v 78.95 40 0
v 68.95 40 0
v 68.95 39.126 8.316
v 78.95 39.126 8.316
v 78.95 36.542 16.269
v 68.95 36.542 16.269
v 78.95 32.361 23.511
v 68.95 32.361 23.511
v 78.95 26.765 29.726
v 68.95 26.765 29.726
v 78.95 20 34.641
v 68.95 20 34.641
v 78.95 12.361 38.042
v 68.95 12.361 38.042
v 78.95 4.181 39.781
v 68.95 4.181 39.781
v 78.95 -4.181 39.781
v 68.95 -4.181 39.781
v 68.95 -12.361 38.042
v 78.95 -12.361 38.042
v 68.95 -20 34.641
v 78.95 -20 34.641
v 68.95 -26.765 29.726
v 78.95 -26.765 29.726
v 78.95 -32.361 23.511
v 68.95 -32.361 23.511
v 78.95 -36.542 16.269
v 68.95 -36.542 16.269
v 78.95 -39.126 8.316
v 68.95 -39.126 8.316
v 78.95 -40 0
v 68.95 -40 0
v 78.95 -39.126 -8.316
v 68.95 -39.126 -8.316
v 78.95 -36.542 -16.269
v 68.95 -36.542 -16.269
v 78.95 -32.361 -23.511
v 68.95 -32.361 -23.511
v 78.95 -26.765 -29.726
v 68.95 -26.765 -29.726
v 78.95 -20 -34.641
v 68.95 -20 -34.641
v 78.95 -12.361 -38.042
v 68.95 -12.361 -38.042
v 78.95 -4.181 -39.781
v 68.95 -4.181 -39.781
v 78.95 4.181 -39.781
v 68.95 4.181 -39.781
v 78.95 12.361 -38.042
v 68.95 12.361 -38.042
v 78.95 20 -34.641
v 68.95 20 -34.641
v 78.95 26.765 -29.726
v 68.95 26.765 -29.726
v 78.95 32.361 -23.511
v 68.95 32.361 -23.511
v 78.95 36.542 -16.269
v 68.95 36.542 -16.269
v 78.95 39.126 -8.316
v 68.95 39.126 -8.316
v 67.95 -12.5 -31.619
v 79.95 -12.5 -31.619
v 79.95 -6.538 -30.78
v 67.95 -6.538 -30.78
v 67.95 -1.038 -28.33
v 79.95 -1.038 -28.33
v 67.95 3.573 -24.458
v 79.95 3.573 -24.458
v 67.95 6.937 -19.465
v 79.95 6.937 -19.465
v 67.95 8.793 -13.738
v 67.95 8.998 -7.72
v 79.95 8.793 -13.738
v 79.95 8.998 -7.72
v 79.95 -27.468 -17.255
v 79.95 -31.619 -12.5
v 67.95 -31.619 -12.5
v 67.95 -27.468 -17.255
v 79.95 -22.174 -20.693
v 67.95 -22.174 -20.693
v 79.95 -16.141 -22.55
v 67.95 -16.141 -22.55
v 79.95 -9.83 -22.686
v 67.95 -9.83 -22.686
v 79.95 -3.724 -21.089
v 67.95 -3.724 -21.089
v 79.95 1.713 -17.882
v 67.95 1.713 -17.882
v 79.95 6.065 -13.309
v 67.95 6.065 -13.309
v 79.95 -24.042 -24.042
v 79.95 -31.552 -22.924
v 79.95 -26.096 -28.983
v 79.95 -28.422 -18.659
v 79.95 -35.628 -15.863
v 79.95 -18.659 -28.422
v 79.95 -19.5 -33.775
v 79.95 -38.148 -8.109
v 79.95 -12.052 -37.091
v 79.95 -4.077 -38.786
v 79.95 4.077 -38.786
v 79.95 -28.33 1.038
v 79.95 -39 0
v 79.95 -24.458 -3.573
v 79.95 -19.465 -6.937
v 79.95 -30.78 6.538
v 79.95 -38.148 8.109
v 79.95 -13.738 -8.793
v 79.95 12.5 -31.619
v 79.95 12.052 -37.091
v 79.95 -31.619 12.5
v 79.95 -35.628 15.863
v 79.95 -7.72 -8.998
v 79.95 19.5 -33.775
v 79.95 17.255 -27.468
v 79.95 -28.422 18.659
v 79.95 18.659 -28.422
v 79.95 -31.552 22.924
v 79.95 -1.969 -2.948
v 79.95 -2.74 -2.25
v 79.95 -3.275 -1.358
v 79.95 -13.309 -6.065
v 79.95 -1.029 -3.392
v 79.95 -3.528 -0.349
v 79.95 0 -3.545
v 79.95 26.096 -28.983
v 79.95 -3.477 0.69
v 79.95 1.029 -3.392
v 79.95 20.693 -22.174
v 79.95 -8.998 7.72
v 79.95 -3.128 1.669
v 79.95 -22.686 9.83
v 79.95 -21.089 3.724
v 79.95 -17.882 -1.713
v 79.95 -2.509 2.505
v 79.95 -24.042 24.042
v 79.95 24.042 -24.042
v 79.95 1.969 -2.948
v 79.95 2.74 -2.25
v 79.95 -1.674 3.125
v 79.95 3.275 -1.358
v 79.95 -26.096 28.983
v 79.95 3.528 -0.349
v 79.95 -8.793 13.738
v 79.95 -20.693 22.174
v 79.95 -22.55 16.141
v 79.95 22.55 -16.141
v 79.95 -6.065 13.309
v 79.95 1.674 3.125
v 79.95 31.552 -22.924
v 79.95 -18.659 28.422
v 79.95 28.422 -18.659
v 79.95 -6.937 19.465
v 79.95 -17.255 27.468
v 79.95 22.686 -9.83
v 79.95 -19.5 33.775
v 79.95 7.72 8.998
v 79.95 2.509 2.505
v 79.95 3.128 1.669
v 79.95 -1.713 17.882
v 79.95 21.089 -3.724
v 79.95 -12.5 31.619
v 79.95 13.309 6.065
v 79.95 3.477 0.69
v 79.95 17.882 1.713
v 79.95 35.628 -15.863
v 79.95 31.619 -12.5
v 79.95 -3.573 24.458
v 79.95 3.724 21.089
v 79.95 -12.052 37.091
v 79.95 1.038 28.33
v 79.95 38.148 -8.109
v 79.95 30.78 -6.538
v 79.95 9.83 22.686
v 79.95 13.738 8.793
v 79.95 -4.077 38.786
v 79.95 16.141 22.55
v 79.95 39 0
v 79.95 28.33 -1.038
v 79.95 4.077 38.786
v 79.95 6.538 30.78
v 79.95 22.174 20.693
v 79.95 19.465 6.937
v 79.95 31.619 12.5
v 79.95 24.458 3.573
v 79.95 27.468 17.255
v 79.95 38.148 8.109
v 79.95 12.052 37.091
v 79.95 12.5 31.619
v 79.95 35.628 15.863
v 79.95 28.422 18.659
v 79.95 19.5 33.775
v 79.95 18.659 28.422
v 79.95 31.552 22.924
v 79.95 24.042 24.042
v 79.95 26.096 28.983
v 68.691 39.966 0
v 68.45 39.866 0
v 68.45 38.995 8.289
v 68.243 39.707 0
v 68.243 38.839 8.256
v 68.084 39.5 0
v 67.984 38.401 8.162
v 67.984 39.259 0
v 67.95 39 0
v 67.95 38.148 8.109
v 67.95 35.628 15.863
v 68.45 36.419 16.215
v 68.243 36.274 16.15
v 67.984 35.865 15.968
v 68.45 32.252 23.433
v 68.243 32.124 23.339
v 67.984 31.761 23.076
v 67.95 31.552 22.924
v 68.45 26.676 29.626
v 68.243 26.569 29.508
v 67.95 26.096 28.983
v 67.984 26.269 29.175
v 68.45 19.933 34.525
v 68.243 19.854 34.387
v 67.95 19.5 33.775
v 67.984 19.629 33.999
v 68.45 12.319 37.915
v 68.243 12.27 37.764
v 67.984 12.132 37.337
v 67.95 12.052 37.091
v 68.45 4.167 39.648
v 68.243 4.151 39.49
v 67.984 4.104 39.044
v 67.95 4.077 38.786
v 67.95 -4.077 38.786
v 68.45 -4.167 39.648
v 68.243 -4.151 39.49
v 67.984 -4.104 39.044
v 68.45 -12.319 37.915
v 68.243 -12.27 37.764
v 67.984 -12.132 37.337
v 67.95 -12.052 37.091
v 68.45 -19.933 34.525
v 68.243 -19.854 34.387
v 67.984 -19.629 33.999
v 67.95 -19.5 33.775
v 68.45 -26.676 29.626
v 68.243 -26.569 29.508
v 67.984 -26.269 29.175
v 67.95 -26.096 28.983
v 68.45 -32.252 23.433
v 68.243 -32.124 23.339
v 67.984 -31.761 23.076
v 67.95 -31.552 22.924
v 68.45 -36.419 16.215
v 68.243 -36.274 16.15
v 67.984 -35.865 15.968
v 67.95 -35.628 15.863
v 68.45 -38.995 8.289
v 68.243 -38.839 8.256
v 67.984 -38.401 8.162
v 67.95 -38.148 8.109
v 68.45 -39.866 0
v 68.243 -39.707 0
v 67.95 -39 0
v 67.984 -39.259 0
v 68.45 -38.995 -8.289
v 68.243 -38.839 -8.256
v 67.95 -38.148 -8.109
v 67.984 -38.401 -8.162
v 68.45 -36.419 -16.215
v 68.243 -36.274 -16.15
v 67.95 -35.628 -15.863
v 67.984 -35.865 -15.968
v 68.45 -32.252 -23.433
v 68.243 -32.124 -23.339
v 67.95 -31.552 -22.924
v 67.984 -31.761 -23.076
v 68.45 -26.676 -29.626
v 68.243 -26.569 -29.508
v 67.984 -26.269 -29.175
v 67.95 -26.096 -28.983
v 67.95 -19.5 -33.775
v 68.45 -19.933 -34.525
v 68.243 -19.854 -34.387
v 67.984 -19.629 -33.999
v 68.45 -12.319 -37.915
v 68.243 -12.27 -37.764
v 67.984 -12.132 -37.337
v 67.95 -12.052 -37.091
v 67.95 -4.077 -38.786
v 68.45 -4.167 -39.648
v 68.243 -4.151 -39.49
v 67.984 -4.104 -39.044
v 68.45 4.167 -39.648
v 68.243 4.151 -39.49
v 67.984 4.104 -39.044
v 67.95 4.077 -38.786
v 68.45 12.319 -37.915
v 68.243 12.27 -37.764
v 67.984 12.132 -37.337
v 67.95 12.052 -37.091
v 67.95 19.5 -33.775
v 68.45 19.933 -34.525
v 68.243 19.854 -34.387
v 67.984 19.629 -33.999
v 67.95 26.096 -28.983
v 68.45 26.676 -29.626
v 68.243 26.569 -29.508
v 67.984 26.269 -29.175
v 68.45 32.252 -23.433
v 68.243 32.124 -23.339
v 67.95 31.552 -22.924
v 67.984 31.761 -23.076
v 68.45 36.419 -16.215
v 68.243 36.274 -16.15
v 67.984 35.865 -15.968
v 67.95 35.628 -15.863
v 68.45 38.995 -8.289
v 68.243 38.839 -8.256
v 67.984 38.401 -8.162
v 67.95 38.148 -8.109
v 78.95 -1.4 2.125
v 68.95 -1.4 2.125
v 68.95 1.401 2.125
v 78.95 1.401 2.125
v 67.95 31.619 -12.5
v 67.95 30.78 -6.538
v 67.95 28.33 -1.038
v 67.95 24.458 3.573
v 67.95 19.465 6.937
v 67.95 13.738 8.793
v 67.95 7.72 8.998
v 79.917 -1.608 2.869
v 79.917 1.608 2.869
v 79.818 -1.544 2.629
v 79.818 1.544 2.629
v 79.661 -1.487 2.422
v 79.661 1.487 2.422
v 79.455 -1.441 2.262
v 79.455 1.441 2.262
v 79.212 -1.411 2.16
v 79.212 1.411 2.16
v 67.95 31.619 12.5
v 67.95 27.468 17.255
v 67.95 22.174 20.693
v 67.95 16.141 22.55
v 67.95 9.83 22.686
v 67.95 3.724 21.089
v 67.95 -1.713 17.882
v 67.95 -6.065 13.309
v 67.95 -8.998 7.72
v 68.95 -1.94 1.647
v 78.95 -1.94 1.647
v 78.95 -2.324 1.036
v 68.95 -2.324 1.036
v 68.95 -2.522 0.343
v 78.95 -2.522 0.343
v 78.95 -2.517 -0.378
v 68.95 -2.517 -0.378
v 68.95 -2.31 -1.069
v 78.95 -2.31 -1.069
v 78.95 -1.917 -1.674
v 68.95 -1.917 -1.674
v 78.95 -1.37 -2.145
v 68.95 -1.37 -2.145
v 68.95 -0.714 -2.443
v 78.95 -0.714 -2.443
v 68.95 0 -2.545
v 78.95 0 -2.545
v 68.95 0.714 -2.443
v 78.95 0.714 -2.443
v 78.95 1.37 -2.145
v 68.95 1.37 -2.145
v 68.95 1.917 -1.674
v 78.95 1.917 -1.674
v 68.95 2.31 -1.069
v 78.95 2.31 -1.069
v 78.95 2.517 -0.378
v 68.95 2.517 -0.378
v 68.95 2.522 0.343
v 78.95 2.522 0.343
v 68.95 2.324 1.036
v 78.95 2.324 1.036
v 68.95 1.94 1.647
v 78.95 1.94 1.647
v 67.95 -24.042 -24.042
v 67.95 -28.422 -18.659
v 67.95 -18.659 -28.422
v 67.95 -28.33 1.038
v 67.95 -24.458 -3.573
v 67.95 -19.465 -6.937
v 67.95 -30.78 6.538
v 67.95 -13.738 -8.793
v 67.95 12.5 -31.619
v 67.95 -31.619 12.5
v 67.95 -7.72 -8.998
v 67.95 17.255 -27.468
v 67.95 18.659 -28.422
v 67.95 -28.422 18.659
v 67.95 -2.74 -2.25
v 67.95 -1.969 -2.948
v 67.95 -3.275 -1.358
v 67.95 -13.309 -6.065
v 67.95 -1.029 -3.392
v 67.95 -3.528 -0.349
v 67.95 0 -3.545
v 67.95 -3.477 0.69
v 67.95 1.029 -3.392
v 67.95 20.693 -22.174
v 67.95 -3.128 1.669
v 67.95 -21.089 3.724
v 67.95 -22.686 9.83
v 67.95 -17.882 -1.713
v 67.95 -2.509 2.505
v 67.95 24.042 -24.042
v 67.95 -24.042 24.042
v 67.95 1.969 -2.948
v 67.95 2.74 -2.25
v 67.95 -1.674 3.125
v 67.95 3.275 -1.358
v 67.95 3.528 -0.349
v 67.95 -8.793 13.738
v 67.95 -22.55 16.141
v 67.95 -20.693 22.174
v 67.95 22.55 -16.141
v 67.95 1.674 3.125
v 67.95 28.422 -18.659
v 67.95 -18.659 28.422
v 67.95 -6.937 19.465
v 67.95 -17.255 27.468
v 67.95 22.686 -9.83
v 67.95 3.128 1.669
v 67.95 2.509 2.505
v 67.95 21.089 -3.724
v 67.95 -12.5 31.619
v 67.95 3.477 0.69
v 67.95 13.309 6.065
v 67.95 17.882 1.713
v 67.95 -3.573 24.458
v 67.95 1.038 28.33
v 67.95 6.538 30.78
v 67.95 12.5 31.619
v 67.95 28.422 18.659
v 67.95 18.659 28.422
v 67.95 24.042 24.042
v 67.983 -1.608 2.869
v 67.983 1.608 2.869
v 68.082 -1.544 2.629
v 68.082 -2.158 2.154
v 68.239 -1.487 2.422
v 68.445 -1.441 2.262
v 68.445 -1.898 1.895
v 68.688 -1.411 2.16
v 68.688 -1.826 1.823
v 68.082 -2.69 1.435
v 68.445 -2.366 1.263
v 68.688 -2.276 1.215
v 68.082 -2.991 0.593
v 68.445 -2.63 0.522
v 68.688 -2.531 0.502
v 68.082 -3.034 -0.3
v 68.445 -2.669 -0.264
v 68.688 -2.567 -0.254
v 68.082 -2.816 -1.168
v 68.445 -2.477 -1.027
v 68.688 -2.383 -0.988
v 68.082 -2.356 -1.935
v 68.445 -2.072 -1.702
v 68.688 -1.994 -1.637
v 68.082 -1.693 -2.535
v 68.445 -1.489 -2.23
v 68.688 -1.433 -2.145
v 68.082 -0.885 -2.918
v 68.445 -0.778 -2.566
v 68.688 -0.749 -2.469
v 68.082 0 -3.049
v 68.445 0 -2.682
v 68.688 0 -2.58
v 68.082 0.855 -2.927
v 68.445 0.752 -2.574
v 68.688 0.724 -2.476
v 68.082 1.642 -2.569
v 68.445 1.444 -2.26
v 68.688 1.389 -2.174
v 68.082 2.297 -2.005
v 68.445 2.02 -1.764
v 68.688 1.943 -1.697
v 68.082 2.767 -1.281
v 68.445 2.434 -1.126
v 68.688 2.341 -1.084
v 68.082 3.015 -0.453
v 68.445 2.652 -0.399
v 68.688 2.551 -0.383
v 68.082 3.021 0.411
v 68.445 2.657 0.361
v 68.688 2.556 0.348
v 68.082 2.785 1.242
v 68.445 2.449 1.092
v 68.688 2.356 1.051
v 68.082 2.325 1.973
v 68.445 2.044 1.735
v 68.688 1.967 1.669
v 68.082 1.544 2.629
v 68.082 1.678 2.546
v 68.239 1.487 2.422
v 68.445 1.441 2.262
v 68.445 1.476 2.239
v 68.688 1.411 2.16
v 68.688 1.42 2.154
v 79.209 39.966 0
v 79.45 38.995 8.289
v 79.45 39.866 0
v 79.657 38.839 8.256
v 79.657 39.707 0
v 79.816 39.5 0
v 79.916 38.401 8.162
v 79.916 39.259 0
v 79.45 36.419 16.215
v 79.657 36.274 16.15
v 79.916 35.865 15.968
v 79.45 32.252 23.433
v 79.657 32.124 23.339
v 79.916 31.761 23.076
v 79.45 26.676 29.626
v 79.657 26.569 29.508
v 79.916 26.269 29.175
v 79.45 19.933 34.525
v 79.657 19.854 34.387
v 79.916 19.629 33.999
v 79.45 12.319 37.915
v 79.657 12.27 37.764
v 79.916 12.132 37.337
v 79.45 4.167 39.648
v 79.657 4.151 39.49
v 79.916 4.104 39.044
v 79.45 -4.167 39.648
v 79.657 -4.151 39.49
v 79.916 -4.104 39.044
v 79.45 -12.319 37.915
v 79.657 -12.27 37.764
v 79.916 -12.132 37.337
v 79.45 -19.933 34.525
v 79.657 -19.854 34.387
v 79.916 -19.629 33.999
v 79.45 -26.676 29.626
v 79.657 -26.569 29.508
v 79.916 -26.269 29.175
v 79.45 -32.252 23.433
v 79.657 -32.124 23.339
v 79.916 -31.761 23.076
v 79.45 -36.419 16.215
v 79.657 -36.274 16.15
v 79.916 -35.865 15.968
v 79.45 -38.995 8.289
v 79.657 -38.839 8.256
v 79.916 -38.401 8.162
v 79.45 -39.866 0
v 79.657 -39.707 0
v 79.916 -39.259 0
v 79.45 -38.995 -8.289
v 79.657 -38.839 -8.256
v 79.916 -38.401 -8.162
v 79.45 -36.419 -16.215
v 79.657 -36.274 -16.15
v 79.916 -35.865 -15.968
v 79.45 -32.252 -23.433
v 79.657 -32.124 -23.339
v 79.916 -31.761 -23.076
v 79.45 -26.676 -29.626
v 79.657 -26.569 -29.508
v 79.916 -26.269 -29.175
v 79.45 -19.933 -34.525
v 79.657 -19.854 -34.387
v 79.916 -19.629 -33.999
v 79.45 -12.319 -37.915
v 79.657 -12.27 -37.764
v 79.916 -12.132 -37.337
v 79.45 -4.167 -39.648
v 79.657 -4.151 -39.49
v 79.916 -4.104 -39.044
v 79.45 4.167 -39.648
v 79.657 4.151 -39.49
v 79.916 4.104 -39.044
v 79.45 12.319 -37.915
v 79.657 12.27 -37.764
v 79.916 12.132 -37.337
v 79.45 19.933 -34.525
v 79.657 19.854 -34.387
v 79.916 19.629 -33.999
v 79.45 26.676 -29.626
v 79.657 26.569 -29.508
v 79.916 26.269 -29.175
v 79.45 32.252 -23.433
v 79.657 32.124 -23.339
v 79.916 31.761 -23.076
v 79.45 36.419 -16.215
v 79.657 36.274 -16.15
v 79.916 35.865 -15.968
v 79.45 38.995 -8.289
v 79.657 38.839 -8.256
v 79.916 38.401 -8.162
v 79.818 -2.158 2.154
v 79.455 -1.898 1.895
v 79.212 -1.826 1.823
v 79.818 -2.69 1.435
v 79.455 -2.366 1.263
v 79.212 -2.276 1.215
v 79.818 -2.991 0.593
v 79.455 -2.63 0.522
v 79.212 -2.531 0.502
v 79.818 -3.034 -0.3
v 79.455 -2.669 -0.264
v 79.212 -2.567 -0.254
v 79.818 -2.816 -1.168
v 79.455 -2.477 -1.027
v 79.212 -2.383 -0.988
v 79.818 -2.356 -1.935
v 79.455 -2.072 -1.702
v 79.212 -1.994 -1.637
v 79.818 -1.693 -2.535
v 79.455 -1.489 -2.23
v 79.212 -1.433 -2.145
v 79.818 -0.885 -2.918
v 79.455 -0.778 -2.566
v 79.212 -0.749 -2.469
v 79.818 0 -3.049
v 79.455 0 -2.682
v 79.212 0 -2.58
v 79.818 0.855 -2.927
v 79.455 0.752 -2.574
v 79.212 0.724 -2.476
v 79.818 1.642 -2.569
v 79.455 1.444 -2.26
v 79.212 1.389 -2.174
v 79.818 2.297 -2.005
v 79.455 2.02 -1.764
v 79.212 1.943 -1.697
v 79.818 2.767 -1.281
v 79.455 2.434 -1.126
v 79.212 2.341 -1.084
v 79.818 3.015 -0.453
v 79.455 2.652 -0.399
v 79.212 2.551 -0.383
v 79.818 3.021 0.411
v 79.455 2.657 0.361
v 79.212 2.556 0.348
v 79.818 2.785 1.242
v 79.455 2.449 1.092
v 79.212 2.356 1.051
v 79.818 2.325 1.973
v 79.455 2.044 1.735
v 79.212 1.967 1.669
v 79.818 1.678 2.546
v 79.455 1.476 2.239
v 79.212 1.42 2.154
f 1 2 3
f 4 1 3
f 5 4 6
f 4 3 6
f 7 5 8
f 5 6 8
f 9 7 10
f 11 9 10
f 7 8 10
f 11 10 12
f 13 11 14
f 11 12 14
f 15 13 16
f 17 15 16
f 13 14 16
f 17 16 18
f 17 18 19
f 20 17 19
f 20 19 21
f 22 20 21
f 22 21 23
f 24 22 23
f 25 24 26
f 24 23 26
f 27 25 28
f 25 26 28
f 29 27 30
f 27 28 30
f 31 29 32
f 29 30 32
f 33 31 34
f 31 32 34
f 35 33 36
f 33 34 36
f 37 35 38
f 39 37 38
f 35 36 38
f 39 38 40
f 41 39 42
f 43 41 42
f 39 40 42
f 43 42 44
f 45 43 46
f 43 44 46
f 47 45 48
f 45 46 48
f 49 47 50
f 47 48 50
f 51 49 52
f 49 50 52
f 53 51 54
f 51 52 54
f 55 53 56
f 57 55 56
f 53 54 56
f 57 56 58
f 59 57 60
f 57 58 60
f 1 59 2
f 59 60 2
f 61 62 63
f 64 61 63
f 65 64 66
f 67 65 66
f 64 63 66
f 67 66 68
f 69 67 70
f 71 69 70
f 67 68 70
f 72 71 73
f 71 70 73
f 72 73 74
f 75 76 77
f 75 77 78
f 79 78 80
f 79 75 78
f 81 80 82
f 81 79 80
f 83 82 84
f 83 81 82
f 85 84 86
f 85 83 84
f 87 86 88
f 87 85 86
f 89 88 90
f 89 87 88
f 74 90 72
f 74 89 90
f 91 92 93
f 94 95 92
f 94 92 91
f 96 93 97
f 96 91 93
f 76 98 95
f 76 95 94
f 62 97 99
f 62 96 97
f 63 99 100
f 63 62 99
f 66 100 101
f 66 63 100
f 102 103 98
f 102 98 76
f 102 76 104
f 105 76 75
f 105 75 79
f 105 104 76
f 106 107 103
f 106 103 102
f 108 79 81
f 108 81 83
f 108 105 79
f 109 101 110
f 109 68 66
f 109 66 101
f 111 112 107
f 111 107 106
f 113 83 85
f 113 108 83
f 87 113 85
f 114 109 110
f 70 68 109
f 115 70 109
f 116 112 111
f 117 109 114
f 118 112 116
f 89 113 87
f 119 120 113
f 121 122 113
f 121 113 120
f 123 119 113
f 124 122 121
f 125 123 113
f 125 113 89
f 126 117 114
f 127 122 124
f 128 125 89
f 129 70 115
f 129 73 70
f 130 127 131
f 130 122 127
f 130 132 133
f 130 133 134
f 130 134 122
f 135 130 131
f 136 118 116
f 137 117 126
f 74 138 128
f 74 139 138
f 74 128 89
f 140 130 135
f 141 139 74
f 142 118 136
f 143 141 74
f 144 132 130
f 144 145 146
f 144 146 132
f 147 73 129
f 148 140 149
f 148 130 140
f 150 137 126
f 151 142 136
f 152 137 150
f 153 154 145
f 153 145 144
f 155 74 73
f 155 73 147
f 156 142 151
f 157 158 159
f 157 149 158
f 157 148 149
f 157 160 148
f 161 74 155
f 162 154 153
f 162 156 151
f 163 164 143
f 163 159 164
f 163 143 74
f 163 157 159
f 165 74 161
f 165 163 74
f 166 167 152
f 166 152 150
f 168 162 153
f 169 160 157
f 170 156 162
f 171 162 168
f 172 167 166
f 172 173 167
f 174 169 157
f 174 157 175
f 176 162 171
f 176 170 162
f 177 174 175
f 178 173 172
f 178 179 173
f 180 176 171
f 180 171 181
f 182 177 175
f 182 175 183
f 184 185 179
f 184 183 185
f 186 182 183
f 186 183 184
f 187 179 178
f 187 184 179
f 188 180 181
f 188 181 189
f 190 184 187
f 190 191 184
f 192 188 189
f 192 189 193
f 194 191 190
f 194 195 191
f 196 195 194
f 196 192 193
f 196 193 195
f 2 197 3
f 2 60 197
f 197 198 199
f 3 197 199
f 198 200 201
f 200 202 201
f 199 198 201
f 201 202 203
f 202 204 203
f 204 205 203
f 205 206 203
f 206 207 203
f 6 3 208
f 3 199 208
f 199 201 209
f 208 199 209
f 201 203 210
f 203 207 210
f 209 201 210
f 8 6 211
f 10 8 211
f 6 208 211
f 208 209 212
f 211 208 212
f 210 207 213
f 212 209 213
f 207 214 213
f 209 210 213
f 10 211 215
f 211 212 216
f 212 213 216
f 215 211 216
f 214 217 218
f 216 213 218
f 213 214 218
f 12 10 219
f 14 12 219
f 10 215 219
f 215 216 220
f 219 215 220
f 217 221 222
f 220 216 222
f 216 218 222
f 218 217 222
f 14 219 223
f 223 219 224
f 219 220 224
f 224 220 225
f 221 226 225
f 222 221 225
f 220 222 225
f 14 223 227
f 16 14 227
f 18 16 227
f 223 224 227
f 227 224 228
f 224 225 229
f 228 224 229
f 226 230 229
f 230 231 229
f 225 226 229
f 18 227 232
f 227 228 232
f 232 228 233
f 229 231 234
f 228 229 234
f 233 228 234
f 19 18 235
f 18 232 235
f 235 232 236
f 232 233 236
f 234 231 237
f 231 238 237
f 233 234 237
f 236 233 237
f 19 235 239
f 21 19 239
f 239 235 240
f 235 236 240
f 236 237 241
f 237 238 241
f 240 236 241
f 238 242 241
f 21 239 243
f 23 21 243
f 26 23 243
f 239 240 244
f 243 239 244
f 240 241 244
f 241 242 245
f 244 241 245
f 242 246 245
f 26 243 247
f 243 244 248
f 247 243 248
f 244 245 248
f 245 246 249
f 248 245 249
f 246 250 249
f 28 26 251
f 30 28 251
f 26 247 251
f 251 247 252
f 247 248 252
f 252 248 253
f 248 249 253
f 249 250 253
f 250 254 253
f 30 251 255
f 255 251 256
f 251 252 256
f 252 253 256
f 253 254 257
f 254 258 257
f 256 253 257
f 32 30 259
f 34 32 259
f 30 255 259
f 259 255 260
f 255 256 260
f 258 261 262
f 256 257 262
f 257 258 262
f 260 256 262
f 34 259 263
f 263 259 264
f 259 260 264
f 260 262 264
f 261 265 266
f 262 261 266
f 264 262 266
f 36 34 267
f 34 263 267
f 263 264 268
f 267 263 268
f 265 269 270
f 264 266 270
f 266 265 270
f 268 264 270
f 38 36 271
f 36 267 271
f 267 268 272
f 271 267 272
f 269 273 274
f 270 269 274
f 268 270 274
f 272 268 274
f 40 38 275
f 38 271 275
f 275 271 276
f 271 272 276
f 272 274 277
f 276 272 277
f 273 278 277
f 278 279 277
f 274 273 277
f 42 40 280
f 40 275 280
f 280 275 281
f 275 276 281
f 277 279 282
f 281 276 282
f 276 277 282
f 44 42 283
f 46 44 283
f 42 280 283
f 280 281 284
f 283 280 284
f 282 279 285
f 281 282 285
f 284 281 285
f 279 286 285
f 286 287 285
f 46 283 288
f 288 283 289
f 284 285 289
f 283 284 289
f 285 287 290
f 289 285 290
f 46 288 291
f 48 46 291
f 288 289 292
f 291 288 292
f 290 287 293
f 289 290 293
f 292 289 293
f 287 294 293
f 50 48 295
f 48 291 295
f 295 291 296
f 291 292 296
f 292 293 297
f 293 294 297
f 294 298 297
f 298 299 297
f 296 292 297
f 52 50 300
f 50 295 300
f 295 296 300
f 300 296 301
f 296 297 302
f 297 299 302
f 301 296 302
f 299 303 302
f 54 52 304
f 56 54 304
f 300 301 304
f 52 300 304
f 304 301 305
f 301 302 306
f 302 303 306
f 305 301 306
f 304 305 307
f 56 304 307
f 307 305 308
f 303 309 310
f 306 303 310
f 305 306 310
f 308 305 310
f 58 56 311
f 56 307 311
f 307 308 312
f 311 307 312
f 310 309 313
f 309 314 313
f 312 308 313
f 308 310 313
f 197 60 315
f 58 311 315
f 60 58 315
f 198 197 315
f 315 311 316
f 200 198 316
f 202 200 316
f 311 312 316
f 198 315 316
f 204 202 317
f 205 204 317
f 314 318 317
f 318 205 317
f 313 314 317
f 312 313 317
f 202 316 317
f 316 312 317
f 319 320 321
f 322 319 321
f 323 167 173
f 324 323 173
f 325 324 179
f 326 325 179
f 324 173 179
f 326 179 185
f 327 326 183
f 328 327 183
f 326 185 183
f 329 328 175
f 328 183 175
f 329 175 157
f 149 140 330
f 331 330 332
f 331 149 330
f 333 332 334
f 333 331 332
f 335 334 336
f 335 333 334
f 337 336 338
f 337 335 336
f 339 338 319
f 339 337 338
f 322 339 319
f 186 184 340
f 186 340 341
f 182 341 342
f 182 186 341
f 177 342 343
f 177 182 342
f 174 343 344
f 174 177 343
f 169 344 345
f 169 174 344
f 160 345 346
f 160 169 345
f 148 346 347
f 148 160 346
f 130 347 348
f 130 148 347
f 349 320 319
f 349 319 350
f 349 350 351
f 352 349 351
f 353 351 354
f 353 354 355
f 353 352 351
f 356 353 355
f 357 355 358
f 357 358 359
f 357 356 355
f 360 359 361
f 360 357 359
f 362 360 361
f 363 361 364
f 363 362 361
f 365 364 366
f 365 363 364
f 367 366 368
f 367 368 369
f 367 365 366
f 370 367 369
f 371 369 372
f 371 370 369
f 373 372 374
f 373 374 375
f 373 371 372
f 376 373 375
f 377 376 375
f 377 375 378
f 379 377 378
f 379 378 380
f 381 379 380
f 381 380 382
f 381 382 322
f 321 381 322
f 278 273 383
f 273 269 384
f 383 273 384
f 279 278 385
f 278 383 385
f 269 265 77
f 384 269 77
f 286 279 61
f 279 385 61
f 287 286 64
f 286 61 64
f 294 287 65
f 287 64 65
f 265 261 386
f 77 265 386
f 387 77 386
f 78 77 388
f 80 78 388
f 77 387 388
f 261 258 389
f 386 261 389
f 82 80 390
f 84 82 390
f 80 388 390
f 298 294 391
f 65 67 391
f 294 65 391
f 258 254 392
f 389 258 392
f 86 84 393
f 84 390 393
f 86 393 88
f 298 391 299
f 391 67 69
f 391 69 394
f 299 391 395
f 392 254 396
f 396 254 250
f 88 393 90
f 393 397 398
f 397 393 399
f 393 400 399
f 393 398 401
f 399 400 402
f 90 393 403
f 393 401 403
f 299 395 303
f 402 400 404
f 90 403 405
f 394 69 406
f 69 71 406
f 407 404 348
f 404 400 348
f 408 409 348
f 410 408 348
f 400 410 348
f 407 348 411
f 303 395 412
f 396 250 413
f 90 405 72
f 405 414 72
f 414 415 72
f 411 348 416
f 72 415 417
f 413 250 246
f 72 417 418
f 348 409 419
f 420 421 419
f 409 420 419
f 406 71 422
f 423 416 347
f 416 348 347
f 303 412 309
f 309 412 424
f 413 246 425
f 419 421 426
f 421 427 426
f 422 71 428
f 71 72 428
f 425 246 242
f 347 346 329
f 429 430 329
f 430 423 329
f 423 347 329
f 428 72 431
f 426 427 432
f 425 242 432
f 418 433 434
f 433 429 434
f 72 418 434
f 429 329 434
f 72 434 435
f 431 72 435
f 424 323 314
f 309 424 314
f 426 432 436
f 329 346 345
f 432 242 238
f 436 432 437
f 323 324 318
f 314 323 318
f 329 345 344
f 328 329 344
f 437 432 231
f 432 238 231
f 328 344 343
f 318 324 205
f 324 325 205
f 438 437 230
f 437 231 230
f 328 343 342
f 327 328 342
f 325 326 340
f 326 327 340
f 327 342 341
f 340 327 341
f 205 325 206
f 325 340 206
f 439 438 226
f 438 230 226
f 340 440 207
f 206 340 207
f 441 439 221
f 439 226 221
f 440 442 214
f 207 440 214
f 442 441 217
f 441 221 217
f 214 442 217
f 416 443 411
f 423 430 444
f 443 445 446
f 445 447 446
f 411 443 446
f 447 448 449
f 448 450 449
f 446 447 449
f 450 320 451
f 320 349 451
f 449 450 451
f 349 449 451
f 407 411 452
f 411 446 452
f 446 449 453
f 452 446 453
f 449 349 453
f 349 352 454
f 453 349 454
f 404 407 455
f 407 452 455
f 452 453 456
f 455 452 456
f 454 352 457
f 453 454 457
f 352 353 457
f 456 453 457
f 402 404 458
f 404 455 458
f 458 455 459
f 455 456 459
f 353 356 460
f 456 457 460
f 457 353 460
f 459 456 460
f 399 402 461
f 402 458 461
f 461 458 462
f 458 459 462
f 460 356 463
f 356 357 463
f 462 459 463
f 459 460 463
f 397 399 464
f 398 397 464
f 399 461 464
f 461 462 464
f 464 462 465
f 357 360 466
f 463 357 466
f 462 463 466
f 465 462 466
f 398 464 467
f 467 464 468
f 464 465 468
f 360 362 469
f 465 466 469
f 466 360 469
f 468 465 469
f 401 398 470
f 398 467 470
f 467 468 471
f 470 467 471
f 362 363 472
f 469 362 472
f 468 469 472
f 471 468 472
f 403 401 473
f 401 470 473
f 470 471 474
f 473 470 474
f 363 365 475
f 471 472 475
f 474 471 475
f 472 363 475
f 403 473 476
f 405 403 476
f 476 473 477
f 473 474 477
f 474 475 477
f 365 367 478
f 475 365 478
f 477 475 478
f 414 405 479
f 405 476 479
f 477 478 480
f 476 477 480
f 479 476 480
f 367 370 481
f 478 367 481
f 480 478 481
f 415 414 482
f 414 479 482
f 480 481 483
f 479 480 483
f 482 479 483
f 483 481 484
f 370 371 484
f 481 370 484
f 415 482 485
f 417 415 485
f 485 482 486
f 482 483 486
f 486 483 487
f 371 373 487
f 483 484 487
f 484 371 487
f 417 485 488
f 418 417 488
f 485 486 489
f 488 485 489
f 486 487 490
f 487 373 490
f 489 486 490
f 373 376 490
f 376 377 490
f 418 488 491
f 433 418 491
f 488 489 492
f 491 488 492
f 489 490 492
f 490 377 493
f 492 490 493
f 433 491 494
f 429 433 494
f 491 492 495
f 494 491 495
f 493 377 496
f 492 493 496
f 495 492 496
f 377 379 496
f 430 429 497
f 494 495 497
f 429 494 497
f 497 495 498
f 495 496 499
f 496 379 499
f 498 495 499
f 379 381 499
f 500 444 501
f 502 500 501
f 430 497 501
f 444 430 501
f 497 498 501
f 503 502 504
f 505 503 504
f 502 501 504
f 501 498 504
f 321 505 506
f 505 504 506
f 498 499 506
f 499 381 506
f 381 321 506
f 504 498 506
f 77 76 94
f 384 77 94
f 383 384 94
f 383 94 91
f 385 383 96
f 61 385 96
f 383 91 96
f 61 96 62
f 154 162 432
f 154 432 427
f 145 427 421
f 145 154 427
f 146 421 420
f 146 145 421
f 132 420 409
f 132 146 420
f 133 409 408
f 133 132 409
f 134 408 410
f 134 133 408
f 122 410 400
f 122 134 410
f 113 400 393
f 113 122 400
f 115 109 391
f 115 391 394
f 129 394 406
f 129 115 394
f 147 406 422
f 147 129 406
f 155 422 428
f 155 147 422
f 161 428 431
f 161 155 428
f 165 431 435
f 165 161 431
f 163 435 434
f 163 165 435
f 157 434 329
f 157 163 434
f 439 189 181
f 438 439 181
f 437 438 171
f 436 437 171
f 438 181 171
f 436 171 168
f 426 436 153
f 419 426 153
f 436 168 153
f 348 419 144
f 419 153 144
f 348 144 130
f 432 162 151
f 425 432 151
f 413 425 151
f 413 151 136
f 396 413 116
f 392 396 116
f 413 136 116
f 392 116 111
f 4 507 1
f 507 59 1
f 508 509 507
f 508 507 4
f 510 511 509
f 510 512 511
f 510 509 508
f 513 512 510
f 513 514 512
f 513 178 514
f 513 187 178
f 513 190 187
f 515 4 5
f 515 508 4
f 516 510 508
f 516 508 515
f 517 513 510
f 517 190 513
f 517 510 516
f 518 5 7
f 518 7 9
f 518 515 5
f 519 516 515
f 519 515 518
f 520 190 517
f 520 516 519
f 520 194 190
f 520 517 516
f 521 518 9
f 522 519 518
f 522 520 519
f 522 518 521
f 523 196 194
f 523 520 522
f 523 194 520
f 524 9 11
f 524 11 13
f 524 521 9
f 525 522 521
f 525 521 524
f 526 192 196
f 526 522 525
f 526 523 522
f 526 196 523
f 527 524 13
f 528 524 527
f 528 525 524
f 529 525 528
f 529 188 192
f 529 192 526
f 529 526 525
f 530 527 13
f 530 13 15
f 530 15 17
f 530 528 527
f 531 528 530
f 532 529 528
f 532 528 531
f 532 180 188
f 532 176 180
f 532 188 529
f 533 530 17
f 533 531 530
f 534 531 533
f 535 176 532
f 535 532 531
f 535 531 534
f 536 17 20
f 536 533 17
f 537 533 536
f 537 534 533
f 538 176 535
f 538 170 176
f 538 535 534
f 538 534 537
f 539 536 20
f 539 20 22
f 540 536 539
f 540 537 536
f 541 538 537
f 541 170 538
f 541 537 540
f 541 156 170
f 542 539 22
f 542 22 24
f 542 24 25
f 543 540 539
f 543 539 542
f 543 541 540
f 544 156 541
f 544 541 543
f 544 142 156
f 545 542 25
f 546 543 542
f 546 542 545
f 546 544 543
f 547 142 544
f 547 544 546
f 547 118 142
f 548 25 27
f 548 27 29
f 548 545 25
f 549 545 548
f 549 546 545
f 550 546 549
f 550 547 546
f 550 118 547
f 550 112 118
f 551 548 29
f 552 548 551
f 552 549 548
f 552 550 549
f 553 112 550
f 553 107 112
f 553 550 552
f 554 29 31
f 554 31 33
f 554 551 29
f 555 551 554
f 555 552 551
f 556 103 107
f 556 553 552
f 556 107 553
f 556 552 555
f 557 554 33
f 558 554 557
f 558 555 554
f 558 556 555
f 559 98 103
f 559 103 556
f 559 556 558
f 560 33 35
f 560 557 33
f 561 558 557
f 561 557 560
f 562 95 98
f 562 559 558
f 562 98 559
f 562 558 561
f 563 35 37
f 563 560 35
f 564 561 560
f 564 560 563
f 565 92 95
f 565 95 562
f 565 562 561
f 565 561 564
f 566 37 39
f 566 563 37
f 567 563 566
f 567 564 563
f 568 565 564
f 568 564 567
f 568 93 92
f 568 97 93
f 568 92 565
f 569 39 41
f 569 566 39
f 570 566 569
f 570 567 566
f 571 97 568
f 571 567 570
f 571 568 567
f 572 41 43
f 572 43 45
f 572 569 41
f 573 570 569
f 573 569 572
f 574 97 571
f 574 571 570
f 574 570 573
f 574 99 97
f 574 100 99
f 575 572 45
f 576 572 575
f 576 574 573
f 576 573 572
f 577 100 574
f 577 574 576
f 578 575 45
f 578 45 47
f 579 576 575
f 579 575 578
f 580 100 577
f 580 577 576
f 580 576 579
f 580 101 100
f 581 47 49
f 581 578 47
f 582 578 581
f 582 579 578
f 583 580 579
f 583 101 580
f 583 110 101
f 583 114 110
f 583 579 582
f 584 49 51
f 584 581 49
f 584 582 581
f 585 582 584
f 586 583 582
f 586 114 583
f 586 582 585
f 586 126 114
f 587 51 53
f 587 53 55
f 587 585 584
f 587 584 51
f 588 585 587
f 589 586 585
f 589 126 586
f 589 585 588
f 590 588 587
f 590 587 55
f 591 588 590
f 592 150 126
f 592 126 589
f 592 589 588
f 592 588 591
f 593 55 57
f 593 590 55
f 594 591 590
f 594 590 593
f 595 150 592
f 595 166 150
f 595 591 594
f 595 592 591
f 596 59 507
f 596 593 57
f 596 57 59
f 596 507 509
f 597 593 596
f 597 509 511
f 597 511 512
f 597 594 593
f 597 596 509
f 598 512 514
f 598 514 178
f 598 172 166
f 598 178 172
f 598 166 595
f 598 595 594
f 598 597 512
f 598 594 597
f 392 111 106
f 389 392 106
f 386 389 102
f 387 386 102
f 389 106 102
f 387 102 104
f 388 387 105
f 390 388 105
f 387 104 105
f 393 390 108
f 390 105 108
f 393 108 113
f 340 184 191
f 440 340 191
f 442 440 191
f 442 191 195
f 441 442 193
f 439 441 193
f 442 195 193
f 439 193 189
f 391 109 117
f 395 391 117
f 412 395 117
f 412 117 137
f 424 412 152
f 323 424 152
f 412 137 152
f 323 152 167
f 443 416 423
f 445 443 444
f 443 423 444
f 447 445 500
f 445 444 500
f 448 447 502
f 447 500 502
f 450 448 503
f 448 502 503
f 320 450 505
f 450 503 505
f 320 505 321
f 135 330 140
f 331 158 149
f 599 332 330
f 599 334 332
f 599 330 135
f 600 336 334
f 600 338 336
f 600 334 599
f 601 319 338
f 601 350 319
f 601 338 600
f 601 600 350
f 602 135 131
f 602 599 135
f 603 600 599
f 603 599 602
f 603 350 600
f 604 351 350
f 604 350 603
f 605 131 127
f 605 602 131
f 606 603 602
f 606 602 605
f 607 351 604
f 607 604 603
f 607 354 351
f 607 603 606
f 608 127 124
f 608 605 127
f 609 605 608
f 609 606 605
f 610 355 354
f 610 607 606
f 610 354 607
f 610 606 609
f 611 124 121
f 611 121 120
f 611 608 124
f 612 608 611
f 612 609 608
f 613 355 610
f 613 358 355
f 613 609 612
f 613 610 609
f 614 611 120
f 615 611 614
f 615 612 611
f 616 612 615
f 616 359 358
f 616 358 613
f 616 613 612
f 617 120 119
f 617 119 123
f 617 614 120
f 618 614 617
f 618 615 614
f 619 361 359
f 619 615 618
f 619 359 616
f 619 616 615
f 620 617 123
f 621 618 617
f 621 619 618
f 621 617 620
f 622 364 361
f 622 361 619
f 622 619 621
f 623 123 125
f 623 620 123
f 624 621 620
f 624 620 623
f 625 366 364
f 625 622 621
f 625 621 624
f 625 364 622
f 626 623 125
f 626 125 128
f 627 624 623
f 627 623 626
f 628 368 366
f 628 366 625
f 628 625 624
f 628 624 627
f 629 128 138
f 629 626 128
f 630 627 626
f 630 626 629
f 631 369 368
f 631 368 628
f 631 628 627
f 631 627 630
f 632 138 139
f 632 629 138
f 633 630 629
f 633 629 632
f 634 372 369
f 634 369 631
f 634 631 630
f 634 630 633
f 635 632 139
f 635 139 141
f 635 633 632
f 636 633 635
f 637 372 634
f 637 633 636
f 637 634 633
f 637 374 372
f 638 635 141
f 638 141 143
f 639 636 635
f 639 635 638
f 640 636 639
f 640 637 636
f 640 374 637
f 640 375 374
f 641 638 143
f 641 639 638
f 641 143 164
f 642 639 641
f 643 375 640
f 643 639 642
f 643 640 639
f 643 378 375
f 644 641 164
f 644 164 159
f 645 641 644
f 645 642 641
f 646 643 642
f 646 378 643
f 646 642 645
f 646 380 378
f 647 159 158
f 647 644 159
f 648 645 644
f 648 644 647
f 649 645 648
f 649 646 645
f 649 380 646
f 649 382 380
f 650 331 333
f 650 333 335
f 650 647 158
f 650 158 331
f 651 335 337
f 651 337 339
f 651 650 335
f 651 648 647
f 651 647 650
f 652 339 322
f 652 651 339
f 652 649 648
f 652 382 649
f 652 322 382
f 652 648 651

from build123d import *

# Parameters (mm, degrees)
SKETCH051_R     = 40
PAD040_DEPTH    = 12
POCKET008_DEPTH = 12
FILLET002_R     = 1


with BuildPart() as part:
    # Sketch051 → Pad040 (new body)
    with BuildSketch(Plane.YZ.offset(67.95)):
        Circle(SKETCH051_R)
        with BuildLine():
            ThreePointArc((-1.4005, 2.125), (0, -2.545), (1.4005, 2.125))
            Line((-1.4005, 2.125), (1.4005, 2.125))
        make_face(mode=Mode.SUBTRACT)
    extrude(amount=PAD040_DEPTH)

    # Sketch052 (on Face5 of Pad040) → Pocket008 (cut)
    with BuildSketch(Plane.YZ.offset(79.95)):
        with BuildLine():
            ThreePointArc((-12.5, 31.618824), (-24.041631, 24.041631), (-31.618824, 12.5))
            ThreePointArc((-31.618824, 12.5), (-24.458371, -3.572618), (-7.720294, -8.99829))
            ThreePointArc((-12.5, 31.618824), (-22.685955, 9.830382), (-7.720294, -8.99829))
        make_face()
        with BuildLine():
            ThreePointArc((31.618824, 12.5), (24.041631, 24.041631), (12.5, 31.618824))
            ThreePointArc((12.5, 31.618824), (-3.572618, 24.458371), (-8.99829, 7.720294))
            ThreePointArc((31.618824, 12.5), (9.830382, 22.685955), (-8.99829, 7.720294))
        make_face()
        with BuildLine():
            ThreePointArc((12.5, -31.618824), (24.041631, -24.041631), (31.618824, -12.5))
            ThreePointArc((31.618824, -12.5), (24.458371, 3.572618), (7.720294, 8.99829))
            ThreePointArc((12.5, -31.618824), (22.685955, -9.830382), (7.720294, 8.99829))
        make_face()
        with BuildLine():
            ThreePointArc((-31.618824, -12.5), (-24.041631, -24.041631), (-12.5, -31.618824))
            ThreePointArc((-12.5, -31.618824), (3.572618, -24.458371), (8.99829, -7.720294))
            ThreePointArc((-31.618824, -12.5), (-9.830382, -22.685955), (8.99829, -7.720294))
        make_face()
    extrude(amount=-POCKET008_DEPTH, mode=Mode.SUBTRACT)

    # Fillet002
    fillet002_edges = [part.edges().sort_by_distance(p)[0] for p in [
        (67.95, 0, 2.125),
        (67.95, 0, -2.545),
        (67.95, -40, 0),
        (79.95, -40, 0),
        (79.95, 0, 2.125),
        (79.95, 0, -2.545),
    ]]
    fillet(fillet002_edges, radius=FILLET002_R)


solid = part.part
